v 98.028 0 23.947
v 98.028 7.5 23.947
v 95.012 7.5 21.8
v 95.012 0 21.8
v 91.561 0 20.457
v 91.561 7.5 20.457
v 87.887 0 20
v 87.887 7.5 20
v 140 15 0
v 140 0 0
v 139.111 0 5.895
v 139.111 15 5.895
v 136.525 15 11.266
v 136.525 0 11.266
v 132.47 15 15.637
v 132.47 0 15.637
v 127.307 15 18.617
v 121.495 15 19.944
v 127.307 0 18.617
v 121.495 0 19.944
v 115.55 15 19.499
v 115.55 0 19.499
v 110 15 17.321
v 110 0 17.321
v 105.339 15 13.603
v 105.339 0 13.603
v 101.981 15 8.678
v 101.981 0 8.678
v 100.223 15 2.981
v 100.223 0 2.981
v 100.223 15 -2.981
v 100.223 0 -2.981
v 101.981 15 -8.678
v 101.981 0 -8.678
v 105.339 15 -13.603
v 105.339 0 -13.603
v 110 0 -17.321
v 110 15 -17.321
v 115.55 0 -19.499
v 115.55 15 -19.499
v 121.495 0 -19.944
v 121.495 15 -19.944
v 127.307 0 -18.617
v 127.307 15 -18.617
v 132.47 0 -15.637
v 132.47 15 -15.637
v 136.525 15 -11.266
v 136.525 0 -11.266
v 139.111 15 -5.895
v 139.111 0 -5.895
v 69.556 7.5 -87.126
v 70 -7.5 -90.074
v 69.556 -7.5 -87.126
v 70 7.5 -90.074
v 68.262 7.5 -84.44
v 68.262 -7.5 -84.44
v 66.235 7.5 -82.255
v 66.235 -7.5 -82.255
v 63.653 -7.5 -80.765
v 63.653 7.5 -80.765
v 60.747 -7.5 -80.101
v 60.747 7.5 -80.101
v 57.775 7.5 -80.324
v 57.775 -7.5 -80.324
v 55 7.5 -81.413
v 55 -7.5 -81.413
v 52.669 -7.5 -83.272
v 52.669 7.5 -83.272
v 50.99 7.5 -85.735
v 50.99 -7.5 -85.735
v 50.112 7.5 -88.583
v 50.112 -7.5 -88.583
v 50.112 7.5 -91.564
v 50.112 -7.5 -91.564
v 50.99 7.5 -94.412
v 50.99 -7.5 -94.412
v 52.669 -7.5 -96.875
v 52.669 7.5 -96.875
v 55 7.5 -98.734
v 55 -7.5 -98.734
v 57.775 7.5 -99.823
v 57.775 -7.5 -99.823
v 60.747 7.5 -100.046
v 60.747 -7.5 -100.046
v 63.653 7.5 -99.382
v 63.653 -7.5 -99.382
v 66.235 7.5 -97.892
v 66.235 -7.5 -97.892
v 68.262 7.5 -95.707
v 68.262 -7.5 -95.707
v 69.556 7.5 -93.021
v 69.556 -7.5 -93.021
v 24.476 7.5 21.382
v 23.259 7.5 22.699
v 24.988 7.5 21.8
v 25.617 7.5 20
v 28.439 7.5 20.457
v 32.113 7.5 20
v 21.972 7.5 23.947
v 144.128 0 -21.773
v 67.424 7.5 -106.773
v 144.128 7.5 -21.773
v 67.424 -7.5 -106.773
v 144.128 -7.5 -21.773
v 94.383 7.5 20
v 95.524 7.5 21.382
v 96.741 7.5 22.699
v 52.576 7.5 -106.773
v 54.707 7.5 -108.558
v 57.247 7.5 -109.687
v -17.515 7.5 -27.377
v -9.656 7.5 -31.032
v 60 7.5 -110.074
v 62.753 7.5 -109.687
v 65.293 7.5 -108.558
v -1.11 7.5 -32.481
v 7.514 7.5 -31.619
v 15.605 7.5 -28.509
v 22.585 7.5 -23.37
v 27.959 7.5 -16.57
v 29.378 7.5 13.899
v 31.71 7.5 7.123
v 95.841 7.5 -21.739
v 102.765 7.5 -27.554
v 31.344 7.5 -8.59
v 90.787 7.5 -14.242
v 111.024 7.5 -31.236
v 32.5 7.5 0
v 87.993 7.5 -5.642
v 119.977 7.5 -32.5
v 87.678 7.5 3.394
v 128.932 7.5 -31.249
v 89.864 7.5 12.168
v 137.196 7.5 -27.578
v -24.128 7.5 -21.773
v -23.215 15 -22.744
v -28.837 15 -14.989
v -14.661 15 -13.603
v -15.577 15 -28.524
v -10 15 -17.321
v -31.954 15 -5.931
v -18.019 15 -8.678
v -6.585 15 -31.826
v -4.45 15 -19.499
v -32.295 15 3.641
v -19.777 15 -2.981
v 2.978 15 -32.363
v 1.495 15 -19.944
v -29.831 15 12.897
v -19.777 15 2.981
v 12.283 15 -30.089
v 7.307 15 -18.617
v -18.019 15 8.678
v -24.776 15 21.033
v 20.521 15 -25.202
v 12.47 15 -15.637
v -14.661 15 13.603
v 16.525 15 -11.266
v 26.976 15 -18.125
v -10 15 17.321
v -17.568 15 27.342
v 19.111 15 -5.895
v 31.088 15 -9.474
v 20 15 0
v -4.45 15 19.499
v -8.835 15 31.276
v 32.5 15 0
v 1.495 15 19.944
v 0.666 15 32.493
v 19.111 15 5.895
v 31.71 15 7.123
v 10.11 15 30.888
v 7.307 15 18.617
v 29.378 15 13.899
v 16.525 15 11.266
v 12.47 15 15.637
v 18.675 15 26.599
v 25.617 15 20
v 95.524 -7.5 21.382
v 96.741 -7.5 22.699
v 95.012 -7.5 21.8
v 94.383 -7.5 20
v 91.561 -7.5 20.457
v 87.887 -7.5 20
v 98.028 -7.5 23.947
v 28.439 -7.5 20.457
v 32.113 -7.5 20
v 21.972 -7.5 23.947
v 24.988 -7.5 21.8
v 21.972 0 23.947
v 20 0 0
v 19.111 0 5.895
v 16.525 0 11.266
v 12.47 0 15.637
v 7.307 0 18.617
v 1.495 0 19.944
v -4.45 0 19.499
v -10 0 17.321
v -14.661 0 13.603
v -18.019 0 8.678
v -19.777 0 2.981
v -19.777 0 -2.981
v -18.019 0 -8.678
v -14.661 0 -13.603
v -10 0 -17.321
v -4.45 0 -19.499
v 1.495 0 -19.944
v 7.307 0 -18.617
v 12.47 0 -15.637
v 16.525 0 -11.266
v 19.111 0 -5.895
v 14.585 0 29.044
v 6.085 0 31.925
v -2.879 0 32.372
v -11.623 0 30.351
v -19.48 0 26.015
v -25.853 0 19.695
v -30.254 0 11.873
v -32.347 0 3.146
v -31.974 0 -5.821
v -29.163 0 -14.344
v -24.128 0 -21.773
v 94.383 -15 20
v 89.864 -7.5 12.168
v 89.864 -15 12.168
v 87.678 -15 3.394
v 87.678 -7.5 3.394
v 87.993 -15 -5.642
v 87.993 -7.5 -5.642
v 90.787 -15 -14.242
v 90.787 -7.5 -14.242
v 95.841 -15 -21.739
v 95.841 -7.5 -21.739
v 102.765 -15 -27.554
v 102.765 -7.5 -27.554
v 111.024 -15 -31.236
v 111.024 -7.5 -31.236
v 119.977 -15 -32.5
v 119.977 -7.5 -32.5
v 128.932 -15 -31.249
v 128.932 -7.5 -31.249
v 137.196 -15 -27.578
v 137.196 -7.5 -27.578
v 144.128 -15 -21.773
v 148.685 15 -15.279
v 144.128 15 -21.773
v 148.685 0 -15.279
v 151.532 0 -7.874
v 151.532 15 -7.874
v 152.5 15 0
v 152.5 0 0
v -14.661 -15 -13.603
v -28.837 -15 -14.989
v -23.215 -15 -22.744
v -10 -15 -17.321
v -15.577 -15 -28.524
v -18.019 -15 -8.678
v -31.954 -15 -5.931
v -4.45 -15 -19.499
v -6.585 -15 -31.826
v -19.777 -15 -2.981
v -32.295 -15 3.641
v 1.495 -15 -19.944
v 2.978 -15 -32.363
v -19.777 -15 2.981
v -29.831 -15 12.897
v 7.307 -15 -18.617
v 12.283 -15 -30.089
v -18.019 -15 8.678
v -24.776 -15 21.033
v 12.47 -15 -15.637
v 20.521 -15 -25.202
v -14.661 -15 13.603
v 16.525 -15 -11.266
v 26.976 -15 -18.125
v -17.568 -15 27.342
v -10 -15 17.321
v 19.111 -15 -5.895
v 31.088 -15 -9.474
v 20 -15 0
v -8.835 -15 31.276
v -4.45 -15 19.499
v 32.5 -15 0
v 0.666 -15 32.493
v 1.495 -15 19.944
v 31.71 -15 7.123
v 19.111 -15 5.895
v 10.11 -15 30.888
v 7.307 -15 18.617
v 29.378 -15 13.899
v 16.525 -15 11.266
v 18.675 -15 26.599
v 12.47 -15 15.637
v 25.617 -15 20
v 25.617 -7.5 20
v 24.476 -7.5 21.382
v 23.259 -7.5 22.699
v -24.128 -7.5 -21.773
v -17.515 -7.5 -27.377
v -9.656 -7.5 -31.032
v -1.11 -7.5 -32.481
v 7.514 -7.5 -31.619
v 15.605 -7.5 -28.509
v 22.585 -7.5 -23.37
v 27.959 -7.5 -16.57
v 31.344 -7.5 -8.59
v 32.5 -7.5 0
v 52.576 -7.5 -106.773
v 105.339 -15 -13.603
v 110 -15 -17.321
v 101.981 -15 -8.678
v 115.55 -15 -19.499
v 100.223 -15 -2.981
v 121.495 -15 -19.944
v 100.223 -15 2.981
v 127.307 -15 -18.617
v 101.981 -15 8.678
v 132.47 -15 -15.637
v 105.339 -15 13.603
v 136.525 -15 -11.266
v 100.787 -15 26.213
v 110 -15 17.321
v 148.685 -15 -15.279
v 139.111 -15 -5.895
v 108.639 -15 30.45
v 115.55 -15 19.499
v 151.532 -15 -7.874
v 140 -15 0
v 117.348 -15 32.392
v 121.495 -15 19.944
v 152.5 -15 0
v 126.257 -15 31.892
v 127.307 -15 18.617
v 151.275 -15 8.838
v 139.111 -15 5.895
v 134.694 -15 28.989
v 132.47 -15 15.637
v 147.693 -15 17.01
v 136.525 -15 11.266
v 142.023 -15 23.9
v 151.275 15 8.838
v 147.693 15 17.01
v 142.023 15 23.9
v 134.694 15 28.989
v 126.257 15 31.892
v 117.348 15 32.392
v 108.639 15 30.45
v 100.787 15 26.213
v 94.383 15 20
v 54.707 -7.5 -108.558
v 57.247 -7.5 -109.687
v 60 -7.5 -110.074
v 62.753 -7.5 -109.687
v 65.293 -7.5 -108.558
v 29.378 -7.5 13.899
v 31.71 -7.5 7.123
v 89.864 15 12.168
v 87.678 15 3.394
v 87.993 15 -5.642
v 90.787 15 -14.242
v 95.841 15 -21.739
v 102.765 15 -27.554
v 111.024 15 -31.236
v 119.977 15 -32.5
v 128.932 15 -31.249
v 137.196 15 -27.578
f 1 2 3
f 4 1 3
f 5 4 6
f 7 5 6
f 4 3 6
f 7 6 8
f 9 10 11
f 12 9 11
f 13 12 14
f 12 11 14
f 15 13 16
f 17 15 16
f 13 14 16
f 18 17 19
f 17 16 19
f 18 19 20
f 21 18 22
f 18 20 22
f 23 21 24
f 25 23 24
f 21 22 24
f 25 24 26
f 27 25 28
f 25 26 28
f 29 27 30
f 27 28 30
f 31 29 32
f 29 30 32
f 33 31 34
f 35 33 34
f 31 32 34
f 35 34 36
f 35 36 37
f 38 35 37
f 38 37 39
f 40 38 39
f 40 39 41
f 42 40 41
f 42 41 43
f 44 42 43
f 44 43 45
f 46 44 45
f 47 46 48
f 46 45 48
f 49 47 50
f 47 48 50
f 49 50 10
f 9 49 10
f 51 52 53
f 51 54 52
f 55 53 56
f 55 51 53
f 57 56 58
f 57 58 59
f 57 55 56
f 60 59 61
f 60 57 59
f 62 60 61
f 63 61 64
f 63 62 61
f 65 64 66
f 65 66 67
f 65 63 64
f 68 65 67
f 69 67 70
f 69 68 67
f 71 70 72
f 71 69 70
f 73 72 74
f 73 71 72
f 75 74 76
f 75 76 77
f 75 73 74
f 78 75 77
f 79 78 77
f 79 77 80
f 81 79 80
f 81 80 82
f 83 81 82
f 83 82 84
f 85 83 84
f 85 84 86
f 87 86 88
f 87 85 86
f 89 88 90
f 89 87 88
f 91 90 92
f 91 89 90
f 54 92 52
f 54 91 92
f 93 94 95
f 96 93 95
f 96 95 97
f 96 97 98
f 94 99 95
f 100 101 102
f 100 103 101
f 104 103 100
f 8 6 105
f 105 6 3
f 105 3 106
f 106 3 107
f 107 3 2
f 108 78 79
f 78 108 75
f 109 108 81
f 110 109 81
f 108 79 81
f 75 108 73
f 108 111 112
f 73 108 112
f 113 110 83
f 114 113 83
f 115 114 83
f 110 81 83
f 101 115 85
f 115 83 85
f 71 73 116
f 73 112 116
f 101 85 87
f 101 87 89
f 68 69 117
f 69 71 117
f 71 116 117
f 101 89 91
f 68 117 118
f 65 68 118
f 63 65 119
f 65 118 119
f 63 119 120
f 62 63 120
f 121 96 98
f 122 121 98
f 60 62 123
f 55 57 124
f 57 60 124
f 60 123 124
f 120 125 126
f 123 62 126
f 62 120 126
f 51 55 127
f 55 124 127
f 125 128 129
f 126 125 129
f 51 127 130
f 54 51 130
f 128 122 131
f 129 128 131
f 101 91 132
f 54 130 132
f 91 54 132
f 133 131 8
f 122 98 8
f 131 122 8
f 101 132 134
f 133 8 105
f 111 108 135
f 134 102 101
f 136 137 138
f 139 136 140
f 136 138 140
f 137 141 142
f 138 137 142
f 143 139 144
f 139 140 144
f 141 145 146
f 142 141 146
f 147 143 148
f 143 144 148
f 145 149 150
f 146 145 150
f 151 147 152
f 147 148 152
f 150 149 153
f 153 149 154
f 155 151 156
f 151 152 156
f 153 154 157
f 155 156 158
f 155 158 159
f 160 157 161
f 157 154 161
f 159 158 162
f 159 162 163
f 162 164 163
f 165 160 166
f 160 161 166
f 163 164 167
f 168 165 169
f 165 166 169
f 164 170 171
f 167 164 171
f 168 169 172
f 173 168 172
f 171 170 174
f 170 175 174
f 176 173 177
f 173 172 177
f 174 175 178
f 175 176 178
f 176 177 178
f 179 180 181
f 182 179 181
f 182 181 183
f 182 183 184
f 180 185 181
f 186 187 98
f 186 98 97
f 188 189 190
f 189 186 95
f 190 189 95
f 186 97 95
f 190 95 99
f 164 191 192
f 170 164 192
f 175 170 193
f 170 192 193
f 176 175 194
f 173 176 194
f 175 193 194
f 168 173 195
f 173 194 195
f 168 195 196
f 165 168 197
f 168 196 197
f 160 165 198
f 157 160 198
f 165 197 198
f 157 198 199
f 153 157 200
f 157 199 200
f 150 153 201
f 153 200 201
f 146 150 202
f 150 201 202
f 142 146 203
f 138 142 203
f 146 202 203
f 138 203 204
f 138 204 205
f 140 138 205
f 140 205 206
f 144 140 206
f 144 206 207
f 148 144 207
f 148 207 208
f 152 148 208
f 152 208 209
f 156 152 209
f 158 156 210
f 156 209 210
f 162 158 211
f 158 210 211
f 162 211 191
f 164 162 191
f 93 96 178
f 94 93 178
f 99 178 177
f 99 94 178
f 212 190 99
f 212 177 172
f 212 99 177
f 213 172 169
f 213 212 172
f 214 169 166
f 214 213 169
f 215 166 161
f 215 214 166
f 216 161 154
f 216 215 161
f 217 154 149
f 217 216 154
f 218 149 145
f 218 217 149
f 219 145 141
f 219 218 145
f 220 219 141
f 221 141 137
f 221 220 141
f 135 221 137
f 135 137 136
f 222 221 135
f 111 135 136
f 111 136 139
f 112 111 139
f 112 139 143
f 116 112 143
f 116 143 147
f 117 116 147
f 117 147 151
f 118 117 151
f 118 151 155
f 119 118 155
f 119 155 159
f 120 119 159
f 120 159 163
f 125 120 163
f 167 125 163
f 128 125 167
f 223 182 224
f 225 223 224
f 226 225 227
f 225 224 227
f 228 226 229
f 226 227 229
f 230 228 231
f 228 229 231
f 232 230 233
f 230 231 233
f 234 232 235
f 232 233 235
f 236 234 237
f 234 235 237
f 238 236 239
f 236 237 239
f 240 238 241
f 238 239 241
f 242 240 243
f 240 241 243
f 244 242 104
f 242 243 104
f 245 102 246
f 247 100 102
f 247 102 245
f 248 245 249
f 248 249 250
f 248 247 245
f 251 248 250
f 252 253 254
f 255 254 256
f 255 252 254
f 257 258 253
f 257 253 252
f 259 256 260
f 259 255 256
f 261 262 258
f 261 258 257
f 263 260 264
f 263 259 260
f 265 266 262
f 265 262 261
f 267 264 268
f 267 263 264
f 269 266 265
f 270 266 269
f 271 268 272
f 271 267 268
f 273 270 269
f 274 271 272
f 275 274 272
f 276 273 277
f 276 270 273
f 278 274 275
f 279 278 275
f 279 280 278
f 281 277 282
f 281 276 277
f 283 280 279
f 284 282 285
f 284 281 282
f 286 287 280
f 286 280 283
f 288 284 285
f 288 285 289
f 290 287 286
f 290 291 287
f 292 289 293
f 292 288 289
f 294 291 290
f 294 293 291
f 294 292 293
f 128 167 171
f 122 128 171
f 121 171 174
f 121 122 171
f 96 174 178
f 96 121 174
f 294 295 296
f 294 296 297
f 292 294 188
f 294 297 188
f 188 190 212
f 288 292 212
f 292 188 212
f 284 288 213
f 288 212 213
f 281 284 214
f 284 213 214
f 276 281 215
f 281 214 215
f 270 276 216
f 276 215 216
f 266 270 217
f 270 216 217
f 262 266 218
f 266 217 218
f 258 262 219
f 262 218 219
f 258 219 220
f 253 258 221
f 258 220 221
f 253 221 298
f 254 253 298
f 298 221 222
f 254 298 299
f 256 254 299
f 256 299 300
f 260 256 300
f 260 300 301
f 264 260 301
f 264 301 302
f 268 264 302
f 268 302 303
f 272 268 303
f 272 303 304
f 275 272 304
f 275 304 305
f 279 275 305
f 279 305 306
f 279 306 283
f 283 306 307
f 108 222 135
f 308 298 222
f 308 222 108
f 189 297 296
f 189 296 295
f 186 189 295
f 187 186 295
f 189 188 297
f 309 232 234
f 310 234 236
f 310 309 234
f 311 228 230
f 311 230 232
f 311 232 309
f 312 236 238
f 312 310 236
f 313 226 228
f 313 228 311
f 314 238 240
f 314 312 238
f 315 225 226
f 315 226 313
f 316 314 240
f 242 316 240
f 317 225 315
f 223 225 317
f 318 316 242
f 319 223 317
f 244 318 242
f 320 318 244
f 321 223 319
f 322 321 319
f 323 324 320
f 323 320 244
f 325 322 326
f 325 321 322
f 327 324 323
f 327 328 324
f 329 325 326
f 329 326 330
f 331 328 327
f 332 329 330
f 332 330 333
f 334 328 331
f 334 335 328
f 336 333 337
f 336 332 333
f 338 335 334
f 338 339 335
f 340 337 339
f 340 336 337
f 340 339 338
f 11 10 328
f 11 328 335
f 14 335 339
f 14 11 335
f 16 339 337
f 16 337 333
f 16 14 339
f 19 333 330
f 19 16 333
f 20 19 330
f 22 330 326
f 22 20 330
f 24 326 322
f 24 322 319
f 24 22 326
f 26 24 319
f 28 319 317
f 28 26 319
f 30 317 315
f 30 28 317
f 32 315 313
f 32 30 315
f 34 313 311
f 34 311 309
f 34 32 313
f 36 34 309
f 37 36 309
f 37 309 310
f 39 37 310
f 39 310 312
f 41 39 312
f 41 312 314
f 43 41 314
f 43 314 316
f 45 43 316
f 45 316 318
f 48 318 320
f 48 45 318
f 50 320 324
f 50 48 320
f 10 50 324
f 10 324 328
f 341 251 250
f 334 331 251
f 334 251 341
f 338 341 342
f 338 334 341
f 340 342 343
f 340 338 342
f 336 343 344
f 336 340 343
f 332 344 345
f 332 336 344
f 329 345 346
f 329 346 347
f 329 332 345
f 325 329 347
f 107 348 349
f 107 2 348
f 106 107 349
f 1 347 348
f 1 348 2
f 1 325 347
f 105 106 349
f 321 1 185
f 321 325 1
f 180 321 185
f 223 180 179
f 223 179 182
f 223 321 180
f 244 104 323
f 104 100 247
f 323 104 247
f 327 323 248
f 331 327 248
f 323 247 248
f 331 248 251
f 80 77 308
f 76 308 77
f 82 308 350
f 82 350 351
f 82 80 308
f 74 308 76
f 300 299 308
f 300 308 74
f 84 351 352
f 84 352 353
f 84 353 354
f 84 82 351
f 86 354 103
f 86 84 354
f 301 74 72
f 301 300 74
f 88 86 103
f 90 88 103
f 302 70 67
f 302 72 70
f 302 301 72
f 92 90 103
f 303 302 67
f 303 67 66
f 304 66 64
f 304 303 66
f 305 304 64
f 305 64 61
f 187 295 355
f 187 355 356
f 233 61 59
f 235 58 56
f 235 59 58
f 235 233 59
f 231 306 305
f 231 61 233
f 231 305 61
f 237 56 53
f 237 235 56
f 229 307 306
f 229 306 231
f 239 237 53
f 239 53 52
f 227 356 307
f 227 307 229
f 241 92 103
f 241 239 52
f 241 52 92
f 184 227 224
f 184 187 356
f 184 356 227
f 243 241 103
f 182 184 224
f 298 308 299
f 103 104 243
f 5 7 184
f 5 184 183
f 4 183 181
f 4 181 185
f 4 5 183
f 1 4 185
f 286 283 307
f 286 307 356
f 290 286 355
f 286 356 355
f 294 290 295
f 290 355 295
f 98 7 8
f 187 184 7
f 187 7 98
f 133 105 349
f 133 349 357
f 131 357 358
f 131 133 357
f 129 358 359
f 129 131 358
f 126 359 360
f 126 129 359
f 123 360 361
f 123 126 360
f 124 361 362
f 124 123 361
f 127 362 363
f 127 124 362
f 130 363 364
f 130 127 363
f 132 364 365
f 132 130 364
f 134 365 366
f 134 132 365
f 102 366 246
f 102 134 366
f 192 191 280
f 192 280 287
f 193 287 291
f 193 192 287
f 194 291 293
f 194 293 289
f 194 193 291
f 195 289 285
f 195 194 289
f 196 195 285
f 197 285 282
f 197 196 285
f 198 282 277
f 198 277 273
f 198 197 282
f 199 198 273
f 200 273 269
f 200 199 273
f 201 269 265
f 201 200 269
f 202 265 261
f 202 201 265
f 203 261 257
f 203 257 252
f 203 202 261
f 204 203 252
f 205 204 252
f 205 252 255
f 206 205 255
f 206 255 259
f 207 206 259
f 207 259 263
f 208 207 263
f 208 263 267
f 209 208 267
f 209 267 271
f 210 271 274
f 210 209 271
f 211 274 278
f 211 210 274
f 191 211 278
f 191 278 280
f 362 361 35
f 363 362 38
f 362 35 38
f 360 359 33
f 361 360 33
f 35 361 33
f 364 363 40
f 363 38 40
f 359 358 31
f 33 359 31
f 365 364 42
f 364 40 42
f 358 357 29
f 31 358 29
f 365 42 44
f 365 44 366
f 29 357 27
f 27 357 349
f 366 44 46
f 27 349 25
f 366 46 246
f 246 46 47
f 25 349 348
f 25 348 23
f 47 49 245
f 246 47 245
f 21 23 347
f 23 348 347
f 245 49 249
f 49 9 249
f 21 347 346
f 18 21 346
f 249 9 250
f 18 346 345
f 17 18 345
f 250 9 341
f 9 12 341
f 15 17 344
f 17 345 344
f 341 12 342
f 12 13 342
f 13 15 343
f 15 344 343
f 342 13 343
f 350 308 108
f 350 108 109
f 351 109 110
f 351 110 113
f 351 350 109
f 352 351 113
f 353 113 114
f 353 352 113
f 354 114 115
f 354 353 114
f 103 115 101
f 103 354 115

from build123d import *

# Parameters (mm, degrees)
F0_R        = 20
F1_DEPTH    = 15
F0_R_2      = 10
F2_DEPTH    = 7.5
F3_T1_DEPTH = 7.5
F3_T3_DEPTH = 7.5


# Not quite as in the source:
# - a fillet or chamfer that OpenCascade refuses, or shapes differently, is made with other operations: its cross-section is extruded or revolved along the edge and cut away or added


with BuildPart() as f1:
    # F0 (on Front) → F1 (new body, symmetric)
    with BuildSketch(Plane.XZ):
        with BuildLine():
            ThreePointArc((-24.128180818, -21.7733986877), (11.6637070311, -30.3349293438), (32.5, 0))
            ThreePointArc((32.5, 0), (30.7312117377, 10.5755673669), (25.6173769149, 20))
            ThreePointArc((25.6173769149, 20), (-20.899967362, 24.8885789925), (-24.128180818, -21.7733986877))
        make_face()
        Circle(F0_R, mode=Mode.SUBTRACT)
    extrude(amount=F1_DEPTH, both=True)



with BuildPart() as f1b:
    # F0 (on Front) → F1, piece 2 (new body, symmetric)
    with BuildSketch(Plane.XZ):
        with BuildLine():
            ThreePointArc((152.5, 0), (130.5755673669, 30.7312117377), (94.3826230851, 20))
            ThreePointArc((94.3826230851, 20), (99.100032638, -24.8885789925), (144.128180818, -21.7733986877))
            ThreePointArc((144.128180818, -21.7733986877), (150.3349293438, -11.6637070311), (152.5, 0))
        make_face()
        with Locations((120, 0)):
            Circle(F0_R, mode=Mode.SUBTRACT)
    extrude(amount=F1_DEPTH, both=True)


with BuildPart() as f1_1:
    add(f1.part)

    add(f1b.part)  # F2 merges F1b
    # F0 (on Front) → F2 (join, symmetric)
    with BuildSketch(Plane.XZ):
        with BuildLine():
            ThreePointArc((25.6173769149, 20), (30.7312117377, 10.5755673669), (32.5, 0))
            ThreePointArc((32.5, 0), (11.6637070311, -30.3349293438), (-24.128180818, -21.7733986877))
            Line((-24.128180818, -21.7733986877), (52.5759443637, -106.773036476))
            ThreePointArc((52.5759443637, -106.773036476), (60, -110.0735291875), (67.4240556363, -106.773036476))
            Line((67.4240556363, -106.773036476), (144.128180818, -21.7733986877))
            ThreePointArc((144.128180818, -21.7733986877), (99.100032638, -24.8885789925), (94.3826230851, 20))
            Line((94.3826230851, 20), (25.6173769149, 20))
        make_face()
        with Locations((60, -90.0735291875)):
            Circle(F0_R_2, mode=Mode.SUBTRACT)
    extrude(amount=F2_DEPTH, both=True)

    # F3: fillet of radius 15 on 4 edges, made by hand

    # F3_s2 → F3_t1 (join)
    with BuildSketch(Plane.XZ.offset(-7.5)):
        with BuildLine():
            ThreePointArc((32.1130814467, 20), (26.6720095708, 21.0216332556), (21.9721083582, 23.9473684211))
            ThreePointArc((21.9721083582, 23.9473684211), (23.8764571598, 22.0491449607), (25.6173769149, 20))
            Line((25.6173769149, 20), (32.1130814467, 20))
        make_face()
        with BuildLine():
            ThreePointArc((98.0278916418, 23.9473684211), (93.3279904292, 21.0216332556), (87.8869185533, 20))
            Line((87.8869185533, 20), (94.3826230851, 20))
            ThreePointArc((94.3826230851, 20), (96.1235428402, 22.0491449607), (98.0278916418, 23.9473684211))
        make_face()
    extrude(amount=F3_T1_DEPTH)

    # F3_s4 → F3_t3 (join)
    with BuildSketch(Plane.XZ):
        with BuildLine():
            ThreePointArc((32.1130814467, 20), (26.6720095708, 21.0216332556), (21.9721083582, 23.9473684211))
            ThreePointArc((21.9721083582, 23.9473684211), (23.8764571598, 22.0491449607), (25.6173769149, 20))
            Line((25.6173769149, 20), (32.1130814467, 20))
        make_face()
        with BuildLine():
            ThreePointArc((87.8869185533, 20), (93.3279904292, 21.0216332556), (98.0278916418, 23.9473684211))
            ThreePointArc((98.0278916418, 23.9473684211), (96.1235428402, 22.0491449607), (94.3826230851, 20))
            Line((94.3826230851, 20), (87.8869185533, 20))
        make_face()
    extrude(amount=F3_T3_DEPTH)


solid = f1_1.part
